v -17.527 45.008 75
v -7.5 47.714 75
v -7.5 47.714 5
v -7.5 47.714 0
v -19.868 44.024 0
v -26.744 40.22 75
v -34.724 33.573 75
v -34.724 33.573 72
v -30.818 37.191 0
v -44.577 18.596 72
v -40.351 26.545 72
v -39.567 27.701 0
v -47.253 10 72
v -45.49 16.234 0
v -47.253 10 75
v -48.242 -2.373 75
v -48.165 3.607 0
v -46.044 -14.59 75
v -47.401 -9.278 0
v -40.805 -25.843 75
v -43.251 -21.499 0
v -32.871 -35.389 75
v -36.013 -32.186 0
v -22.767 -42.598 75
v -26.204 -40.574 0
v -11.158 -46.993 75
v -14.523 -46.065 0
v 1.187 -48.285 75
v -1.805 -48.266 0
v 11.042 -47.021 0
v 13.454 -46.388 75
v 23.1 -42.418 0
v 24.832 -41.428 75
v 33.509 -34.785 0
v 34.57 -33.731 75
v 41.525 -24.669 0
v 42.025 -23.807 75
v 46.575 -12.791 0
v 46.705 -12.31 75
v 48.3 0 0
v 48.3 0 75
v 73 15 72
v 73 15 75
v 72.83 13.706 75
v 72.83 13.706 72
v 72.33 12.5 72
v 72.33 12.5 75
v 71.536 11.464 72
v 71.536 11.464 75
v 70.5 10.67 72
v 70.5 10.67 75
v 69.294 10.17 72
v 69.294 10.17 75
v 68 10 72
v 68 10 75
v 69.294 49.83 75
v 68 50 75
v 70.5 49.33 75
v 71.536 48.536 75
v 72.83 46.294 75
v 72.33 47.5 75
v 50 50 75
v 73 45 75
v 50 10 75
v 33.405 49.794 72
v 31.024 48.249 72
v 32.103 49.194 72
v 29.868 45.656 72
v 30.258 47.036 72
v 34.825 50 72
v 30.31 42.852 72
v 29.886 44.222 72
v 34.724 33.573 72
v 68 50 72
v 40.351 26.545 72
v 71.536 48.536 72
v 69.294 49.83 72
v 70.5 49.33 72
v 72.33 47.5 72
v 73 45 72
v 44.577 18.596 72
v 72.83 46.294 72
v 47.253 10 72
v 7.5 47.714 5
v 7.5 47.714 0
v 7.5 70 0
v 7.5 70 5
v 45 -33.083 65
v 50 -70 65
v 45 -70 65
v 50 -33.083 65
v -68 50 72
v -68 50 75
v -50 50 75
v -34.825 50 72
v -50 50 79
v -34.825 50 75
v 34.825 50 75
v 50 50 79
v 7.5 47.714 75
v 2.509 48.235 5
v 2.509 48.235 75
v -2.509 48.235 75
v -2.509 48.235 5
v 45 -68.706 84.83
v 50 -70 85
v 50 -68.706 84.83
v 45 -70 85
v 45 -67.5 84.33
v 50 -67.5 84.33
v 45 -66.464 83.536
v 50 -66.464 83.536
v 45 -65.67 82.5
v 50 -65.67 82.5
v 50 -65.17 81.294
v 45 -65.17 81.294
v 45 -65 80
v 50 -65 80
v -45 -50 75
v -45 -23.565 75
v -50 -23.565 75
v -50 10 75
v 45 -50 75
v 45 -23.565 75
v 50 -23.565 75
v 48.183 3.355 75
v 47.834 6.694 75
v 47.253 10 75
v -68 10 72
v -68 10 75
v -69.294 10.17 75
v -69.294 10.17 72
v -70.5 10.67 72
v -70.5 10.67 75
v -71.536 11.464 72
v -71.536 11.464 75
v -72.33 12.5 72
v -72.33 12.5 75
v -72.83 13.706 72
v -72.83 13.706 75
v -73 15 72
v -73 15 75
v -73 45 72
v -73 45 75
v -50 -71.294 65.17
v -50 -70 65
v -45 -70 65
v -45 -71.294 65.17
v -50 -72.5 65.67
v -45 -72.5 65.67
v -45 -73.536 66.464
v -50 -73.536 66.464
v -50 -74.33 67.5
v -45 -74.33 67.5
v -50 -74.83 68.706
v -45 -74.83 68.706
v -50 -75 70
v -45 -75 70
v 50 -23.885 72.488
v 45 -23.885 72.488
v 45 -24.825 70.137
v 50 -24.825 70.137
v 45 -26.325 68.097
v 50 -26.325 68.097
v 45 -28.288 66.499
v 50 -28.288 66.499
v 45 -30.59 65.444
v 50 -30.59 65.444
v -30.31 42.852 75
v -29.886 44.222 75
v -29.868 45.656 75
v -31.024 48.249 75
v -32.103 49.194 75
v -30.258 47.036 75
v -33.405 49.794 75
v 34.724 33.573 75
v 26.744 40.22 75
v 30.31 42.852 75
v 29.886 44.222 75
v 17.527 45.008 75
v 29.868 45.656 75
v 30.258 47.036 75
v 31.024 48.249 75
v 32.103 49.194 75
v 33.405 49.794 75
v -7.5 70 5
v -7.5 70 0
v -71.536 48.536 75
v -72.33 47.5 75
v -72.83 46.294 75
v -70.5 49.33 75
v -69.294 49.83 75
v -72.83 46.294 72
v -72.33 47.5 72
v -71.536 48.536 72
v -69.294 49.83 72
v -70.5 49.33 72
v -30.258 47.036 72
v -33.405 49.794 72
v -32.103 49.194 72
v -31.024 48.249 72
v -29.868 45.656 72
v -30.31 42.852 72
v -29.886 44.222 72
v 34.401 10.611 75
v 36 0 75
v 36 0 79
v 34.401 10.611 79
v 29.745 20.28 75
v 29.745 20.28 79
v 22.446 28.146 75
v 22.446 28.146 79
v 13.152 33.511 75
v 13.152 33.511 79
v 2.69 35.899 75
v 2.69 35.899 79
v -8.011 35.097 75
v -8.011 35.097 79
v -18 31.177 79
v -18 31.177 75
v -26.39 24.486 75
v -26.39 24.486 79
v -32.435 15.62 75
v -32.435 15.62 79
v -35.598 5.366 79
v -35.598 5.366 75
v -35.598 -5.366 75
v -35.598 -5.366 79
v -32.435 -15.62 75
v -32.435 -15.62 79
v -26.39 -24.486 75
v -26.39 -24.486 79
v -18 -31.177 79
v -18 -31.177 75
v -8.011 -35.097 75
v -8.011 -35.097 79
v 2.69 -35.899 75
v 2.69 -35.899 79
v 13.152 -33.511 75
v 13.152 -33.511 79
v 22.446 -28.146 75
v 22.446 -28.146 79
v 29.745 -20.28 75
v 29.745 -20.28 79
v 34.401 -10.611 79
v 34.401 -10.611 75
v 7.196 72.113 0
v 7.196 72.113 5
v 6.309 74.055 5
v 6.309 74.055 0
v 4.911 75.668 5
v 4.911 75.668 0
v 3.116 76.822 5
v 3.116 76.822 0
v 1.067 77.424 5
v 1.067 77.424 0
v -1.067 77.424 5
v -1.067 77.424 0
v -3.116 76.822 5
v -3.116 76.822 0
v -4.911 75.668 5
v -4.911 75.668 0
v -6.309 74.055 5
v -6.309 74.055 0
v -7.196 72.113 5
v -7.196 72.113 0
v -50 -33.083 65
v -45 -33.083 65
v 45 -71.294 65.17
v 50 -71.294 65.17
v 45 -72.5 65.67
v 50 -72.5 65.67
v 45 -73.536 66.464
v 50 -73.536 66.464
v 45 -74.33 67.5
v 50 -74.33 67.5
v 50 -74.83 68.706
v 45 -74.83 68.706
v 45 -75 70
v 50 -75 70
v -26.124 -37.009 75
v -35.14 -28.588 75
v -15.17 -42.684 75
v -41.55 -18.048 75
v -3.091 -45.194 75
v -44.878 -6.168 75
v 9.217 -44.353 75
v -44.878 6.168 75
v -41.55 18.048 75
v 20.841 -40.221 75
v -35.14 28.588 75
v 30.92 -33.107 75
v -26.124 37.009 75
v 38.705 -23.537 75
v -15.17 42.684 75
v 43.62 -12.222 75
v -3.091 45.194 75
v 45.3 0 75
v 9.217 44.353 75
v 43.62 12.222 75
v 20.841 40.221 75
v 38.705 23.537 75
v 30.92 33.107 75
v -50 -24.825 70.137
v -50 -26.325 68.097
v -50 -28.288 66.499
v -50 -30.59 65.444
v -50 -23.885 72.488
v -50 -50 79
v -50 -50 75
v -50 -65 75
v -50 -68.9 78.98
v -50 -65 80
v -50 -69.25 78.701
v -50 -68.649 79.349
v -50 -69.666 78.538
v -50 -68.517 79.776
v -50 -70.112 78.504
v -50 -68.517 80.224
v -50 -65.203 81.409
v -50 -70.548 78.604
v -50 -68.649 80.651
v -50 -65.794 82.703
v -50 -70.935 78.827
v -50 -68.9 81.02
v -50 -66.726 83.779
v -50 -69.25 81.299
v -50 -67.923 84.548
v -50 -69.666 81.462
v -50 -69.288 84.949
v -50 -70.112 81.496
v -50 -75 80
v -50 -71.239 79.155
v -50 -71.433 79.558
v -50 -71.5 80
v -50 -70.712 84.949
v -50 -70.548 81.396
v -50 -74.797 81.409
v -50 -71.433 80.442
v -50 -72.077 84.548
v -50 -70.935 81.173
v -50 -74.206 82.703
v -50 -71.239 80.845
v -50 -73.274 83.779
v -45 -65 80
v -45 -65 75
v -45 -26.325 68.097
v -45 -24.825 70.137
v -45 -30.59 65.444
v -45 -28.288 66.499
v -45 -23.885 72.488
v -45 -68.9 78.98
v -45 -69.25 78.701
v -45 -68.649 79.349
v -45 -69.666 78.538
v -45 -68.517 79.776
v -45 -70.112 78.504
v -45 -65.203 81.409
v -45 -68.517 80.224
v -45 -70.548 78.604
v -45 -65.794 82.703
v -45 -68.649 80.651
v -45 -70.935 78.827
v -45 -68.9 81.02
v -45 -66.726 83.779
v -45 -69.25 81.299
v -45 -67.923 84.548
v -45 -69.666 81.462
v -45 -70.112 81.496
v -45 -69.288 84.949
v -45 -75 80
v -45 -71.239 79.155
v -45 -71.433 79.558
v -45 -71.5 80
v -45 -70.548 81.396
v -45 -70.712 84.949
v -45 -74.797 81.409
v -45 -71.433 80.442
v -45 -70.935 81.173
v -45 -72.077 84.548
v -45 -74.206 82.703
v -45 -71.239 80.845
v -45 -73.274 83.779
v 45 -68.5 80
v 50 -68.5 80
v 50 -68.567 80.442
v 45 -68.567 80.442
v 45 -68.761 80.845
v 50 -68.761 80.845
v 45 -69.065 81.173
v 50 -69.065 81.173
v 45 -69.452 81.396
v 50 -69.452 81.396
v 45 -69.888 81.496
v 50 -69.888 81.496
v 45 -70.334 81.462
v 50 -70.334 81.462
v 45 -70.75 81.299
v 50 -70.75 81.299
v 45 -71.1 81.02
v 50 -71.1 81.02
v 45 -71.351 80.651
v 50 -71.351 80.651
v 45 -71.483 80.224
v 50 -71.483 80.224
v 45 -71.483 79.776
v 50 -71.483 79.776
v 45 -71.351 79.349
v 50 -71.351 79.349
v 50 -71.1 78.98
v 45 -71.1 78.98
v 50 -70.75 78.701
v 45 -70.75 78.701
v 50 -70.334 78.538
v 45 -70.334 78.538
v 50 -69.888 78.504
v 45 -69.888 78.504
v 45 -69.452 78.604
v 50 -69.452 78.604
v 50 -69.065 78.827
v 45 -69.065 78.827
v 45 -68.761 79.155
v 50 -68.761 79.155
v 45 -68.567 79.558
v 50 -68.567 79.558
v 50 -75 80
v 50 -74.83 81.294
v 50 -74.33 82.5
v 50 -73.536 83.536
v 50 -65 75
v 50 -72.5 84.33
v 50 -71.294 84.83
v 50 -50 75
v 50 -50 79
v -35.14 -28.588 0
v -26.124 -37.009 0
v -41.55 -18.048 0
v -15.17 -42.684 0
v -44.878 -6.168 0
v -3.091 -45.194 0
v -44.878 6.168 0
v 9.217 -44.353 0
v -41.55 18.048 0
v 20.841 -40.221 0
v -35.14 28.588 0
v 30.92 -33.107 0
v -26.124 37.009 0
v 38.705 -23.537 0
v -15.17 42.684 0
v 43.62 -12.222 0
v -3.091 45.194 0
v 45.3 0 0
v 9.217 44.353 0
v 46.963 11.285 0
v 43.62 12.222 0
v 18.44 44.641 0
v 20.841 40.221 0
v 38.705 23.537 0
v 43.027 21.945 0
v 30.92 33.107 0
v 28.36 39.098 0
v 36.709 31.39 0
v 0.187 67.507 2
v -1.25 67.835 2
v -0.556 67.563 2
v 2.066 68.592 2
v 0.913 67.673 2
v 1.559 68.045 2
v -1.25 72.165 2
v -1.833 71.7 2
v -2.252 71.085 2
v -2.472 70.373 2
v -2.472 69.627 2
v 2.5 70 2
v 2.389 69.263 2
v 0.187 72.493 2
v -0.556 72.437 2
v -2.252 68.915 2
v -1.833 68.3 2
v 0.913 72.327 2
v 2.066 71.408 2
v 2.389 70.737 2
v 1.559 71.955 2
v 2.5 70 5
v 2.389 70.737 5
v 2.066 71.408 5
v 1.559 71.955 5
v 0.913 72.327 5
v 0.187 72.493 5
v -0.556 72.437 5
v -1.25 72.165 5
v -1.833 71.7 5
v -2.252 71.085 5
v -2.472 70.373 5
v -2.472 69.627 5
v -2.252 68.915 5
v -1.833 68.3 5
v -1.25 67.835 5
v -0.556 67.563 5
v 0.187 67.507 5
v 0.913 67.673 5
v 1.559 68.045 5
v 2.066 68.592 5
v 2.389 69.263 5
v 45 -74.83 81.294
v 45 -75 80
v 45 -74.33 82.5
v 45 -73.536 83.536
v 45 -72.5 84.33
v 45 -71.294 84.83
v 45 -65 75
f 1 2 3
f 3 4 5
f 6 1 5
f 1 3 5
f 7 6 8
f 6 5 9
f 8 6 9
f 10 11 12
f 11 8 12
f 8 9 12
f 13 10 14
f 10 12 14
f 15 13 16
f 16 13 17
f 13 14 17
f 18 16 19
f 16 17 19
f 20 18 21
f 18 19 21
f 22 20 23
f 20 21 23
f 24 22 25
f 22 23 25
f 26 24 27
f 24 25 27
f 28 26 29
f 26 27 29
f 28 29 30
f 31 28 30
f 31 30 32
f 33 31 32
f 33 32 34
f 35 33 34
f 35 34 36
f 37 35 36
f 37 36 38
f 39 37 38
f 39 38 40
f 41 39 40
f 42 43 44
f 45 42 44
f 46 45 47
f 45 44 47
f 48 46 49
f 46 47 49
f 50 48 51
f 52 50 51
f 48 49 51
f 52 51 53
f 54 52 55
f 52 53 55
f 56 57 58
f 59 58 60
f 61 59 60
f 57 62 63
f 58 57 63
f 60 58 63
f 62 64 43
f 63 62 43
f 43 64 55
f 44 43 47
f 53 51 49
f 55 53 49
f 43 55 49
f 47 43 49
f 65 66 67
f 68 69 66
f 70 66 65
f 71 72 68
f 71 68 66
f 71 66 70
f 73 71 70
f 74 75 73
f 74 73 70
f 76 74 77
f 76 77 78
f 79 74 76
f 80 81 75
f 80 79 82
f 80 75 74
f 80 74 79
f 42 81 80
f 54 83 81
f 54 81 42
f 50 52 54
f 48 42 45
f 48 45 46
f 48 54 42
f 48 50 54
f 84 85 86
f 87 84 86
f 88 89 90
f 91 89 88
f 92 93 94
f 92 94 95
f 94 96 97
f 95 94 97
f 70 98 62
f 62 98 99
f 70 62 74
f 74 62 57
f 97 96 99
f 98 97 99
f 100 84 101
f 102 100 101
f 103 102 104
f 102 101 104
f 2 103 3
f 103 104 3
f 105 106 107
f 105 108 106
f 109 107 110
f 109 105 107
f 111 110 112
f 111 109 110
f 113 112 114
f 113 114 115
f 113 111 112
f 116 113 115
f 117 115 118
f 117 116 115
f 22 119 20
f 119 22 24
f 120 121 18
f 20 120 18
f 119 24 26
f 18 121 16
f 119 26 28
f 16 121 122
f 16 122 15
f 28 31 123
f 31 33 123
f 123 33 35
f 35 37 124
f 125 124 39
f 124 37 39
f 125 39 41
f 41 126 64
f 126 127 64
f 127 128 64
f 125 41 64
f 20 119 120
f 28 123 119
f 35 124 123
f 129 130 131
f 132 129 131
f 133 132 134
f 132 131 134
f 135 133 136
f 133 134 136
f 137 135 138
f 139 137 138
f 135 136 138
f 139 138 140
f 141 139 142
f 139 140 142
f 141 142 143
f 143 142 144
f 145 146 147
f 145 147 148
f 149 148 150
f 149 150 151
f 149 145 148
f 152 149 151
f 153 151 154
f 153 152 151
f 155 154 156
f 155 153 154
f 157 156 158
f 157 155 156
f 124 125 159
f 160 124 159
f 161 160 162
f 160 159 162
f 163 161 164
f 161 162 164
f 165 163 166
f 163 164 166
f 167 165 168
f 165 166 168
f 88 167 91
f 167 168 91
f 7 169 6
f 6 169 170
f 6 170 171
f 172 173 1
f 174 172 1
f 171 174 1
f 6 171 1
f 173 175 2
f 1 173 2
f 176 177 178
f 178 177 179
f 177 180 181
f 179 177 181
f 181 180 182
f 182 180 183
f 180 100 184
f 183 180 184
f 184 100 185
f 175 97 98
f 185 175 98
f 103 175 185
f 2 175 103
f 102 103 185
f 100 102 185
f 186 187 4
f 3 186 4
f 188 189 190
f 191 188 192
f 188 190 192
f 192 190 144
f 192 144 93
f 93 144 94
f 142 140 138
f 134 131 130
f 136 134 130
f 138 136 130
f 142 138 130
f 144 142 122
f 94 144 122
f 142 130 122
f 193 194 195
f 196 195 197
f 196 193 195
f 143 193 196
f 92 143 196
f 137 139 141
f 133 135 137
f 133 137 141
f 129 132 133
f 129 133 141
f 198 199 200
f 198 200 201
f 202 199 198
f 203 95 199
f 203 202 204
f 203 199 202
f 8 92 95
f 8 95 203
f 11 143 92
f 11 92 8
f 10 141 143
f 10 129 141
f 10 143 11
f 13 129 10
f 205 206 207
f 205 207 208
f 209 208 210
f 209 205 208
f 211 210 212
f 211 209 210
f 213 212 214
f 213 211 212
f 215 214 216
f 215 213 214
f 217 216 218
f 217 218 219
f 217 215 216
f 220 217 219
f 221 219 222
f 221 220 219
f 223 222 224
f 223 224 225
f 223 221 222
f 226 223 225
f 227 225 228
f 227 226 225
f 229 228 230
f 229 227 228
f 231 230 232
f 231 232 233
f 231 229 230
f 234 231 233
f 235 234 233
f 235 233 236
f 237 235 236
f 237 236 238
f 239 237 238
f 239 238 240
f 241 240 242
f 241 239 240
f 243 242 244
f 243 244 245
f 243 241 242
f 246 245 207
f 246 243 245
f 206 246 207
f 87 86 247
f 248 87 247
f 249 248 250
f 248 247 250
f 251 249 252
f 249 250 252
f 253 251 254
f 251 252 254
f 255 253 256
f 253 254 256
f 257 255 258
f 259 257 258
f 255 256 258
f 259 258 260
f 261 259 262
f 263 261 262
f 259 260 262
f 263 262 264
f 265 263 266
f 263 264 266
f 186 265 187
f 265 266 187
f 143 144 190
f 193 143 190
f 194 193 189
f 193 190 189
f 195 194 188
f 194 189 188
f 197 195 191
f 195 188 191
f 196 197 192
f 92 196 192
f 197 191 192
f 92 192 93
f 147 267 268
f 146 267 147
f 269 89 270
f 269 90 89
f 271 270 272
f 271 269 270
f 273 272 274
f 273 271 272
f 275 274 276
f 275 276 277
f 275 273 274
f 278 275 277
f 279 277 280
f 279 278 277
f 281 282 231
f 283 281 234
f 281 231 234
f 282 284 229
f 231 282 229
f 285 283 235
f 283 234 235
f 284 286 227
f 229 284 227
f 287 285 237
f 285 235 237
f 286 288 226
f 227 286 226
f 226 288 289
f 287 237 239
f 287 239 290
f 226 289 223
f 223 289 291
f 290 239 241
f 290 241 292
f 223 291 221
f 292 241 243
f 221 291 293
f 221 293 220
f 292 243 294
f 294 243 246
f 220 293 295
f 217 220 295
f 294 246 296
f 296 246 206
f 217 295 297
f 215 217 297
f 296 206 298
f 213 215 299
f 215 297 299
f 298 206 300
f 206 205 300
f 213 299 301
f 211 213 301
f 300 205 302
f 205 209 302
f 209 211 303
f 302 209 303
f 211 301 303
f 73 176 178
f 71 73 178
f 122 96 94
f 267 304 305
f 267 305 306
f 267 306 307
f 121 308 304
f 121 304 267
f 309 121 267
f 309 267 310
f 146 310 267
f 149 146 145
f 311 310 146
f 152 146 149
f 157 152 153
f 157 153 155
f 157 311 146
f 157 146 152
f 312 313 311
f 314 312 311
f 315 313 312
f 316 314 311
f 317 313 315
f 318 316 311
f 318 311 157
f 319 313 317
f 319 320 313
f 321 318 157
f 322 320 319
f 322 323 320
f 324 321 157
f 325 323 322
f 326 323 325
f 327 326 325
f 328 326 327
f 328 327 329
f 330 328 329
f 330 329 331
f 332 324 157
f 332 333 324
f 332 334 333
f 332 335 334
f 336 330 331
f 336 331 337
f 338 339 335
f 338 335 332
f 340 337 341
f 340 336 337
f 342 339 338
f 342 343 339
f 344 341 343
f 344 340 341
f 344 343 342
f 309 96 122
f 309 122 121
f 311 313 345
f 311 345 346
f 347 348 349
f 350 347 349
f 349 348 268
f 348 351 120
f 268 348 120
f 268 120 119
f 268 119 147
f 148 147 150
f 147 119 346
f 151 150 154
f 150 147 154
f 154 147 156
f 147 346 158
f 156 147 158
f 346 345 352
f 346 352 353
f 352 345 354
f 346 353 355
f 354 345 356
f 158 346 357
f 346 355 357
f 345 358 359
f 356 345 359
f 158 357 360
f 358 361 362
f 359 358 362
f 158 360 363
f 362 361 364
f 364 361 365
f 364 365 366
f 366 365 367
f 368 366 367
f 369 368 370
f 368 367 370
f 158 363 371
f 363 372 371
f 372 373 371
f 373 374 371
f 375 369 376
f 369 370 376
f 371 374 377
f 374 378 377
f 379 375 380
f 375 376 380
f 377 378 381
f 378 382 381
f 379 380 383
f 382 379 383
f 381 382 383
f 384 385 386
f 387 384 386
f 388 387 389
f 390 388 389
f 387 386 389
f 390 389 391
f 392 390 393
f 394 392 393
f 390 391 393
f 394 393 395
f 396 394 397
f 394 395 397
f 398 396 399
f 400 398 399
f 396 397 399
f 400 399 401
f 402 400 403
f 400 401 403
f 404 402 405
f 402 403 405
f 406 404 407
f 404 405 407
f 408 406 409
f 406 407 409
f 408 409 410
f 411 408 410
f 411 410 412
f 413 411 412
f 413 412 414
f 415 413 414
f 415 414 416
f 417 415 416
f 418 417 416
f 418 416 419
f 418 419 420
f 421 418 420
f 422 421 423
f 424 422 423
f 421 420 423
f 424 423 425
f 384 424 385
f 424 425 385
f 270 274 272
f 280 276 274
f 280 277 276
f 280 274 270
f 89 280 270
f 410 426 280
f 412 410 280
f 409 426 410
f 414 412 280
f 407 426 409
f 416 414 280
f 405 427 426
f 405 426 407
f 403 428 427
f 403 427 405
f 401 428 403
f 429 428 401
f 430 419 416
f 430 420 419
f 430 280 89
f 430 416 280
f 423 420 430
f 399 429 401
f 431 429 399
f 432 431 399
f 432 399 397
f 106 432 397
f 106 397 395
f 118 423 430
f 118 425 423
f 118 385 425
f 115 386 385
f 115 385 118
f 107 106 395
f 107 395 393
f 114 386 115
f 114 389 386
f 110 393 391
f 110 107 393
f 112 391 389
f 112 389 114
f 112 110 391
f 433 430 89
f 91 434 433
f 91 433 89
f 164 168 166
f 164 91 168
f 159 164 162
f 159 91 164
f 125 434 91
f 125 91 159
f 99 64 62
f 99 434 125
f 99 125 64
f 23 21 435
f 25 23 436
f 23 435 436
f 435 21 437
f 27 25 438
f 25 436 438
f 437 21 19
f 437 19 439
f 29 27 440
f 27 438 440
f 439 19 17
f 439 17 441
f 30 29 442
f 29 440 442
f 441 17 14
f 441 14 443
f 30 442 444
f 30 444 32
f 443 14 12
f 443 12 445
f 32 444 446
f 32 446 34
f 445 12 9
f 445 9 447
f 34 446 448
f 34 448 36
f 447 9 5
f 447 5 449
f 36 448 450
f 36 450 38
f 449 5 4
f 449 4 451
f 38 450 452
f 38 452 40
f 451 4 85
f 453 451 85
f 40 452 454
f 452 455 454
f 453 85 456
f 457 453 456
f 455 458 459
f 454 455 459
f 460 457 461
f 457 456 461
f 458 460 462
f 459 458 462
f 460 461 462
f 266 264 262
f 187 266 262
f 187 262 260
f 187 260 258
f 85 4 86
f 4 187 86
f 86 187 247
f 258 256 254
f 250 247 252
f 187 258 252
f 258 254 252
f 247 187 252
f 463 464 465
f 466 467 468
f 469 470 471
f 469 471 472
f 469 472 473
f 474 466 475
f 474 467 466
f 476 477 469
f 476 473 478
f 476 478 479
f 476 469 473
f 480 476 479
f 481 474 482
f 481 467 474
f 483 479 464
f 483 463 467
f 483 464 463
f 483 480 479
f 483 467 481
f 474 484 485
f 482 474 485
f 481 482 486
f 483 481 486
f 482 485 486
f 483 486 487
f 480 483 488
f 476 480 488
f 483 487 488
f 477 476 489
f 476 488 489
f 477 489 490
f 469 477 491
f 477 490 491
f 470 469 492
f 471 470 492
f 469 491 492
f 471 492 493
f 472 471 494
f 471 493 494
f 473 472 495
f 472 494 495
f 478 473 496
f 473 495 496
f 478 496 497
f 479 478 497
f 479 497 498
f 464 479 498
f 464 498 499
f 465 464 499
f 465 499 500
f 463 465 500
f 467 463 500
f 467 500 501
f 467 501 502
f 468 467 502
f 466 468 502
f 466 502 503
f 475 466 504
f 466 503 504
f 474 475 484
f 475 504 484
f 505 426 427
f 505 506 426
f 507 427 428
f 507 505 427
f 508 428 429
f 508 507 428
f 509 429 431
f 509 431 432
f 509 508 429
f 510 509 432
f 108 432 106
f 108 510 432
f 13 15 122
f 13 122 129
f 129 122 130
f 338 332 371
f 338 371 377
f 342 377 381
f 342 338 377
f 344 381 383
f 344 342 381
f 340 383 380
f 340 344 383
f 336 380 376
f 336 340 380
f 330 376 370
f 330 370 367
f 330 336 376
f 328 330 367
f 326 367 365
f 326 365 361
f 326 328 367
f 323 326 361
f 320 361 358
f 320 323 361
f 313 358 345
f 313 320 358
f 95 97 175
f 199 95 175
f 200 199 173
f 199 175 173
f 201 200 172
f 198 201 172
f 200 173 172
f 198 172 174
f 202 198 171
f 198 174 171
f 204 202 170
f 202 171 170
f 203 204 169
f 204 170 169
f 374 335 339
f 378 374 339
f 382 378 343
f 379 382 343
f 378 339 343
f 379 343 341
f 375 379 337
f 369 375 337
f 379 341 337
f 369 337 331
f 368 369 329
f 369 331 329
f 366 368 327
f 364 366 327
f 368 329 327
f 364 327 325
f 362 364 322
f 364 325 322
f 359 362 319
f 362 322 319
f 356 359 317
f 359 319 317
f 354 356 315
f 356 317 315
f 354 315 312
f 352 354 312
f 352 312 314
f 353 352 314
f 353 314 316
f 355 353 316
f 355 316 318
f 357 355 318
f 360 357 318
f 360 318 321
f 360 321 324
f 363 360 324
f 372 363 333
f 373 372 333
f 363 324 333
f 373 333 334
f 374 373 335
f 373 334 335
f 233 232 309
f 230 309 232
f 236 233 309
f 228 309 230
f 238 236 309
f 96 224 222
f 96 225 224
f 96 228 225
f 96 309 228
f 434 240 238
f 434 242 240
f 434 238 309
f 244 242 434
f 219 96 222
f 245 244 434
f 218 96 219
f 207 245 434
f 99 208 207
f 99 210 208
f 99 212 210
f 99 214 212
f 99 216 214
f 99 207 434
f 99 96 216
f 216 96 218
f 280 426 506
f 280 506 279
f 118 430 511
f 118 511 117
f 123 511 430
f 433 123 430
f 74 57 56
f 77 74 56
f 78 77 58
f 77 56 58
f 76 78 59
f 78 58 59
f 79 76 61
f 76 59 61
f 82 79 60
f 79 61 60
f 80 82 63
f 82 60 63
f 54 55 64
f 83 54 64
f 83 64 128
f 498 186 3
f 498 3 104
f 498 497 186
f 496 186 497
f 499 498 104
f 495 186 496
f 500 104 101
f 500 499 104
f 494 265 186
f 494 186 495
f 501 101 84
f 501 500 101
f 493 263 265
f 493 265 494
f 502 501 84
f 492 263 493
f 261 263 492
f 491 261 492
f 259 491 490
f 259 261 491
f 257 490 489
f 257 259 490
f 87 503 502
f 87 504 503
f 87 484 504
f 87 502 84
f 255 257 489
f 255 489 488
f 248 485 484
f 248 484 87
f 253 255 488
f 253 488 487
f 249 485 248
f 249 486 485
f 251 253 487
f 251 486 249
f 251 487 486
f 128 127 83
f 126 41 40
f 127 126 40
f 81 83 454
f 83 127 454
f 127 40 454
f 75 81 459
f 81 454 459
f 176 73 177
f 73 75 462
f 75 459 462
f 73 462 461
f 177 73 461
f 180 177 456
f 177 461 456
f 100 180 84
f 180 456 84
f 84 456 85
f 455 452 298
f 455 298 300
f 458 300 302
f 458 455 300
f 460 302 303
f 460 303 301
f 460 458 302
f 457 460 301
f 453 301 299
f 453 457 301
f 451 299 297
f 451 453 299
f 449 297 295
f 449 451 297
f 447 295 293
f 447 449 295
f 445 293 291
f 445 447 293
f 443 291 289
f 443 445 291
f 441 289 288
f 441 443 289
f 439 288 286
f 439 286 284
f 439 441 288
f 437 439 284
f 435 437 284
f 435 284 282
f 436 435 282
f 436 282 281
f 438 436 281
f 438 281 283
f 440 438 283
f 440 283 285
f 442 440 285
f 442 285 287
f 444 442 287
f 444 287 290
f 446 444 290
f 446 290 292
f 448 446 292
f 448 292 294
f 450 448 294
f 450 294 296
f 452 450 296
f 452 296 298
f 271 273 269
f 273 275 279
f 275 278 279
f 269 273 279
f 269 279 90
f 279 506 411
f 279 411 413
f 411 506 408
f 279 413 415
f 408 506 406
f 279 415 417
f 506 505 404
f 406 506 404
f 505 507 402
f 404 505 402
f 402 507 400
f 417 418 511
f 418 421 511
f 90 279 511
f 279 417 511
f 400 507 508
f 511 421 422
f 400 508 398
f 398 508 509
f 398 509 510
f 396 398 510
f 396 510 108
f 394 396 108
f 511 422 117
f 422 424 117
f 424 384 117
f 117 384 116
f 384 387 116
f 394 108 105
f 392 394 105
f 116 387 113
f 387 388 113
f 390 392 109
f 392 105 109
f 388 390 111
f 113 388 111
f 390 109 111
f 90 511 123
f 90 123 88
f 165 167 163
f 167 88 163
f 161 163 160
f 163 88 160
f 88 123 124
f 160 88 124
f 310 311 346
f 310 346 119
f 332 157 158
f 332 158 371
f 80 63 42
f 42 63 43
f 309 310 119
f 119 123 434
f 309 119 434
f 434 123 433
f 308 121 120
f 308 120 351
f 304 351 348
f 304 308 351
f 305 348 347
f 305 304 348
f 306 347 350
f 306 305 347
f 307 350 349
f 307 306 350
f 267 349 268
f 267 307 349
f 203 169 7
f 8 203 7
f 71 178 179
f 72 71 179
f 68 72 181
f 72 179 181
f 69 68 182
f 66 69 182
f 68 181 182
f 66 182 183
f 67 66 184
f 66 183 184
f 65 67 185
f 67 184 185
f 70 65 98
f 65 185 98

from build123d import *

# Parameters (mm, degrees)
F0_R      = 45.3
F1_DEPTH  = 75
F2_DEPTH  = 5
F3_R      = 2.5
F4_DEPTH  = 3
F5_W      = 100
F5_H      = 100
F5_R      = 48.3
F5_R_2    = 45.3
F5_R_3    = 36
F6_DEPTH  = 4
F8_DEPTH  = 3
F9_W      = 5
F9_H      = 26.435303688
F9_H_2    = 20
F10_DEPTH = 10
F12_DEPTH = 5
F14_DEPTH = 5
F15_R     = 5
F16_R     = 4.99999
F17_R     = 1.5
F18_DEPTH = 5
F20_R     = 1.5
F21_DEPTH = 5


# Not quite as in the source:
# - a fillet or chamfer is up to 0.001 mm smaller than in the source, because OpenCascade refuses the exact size


with BuildPart() as f1:
    # F0 (on Top) → F1 (new body)
    with BuildSketch(Plane.XY):
        with BuildLine():
            ThreePointArc((-7.5, 47.714148845), (-31.3898072629, -36.7092631362), (48.3, 0))
            ThreePointArc((48.3, 0), (36.7092631362, 31.3898072629), (7.5, 47.714148845))
            Line((7.5, 47.714148845), (7.5, 46.6673743725))
            Line((7.5, 46.6673743725), (-7.5, 46.6673743725))
            Line((-7.5, 46.6673743725), (-7.5, 47.714148845))
        make_face()
        Circle(F0_R, mode=Mode.SUBTRACT)
        with BuildLine():
            Line((7.5, 46.6673743725), (7.5, 47.714148845))
            ThreePointArc((7.5, 47.714148845), (0, 48.3), (-7.5, 47.714148845))
            Line((-7.5, 47.714148845), (-7.5, 46.6673743725))
            Line((-7.5, 46.6673743725), (7.5, 46.6673743725))
        make_face()
    extrude(amount=F1_DEPTH)

    # F0 (on Top) → F2 (join)
    with BuildSketch(Plane.XY):
        with BuildLine():
            ThreePointArc((-7.5, 47.714148845), (-31.3898072629, -36.7092631362), (48.3, 0))
            ThreePointArc((48.3, 0), (36.7092631362, 31.3898072629), (7.5, 47.714148845))
            Line((7.5, 47.714148845), (7.5, 46.6673743725))
            Line((7.5, 46.6673743725), (-7.5, 46.6673743725))
            Line((-7.5, 46.6673743725), (-7.5, 47.714148845))
        make_face()
        Circle(F0_R, mode=Mode.SUBTRACT)
        with BuildLine():
            Line((7.5, 46.6673743725), (7.5, 47.714148845))
            ThreePointArc((7.5, 47.714148845), (0, 48.3), (-7.5, 47.714148845))
            Line((-7.5, 47.714148845), (-7.5, 46.6673743725))
            Line((-7.5, 46.6673743725), (7.5, 46.6673743725))
        make_face()
        with BuildLine():
            ThreePointArc((-7.5, 47.714148845), (0, 48.3), (7.5, 47.714148845))
            Line((7.5, 47.714148845), (7.5, 70))
            ThreePointArc((7.5, 70), (0, 77.5), (-7.5, 70))
            Line((-7.5, 70), (-7.5, 47.714148845))
        make_face()
    extrude(amount=F2_DEPTH)

    # F3 (on face) → F4 (cut)
    with BuildSketch(Plane.XY.offset(5)):
        with Locations((0, 70)):
            Circle(F3_R)
    extrude(amount=-F4_DEPTH, mode=Mode.SUBTRACT)

    # F5 (on face) → F6 (join)
    with BuildSketch(Plane.XY.offset(75)):
        Rectangle(F5_W, F5_H)
        Circle(F5_R, mode=Mode.SUBTRACT)
        Circle(F5_R)
        Circle(F5_R_2, mode=Mode.SUBTRACT)
        Circle(F5_R_2)
        Circle(F5_R_3, mode=Mode.SUBTRACT)
    extrude(amount=F6_DEPTH)

    # F7 (on face) → F8 (join)
    with BuildSketch(Plane(origin=(0, 0, 75), x_dir=(1, 0, 0), z_dir=(0, 0, -1))):
        with BuildLine():
            Line((-68, -50), (-45.938372612, -50))
            Line((-45.938372612, -50), (-34.8247885738, -50))
            ThreePointArc((-34.8247885738, -50), (-30.5975043414, -47.6702187211), (-30.3096791752, -42.8520272073))
            Line((-30.3096791752, -42.8520272073), (-45.938372612, -10))
            Line((-45.938372612, -10), (-68, -10))
            ThreePointArc((-68, -10), (-71.5355339059, -11.4644660941), (-73, -15))
            Line((-73, -15), (-73, -45))
            ThreePointArc((-73, -45), (-71.5355339059, -48.5355339059), (-68, -50))
        make_face()
        with BuildLine():
            Line((68, -10), (45.938372612, -10))
            Line((45.938372612, -10), (30.3096791752, -42.8520272073))
            ThreePointArc((30.3096791752, -42.8520272073), (30.5975043414, -47.6702187211), (34.8247885738, -50))
            Line((34.8247885738, -50), (45.938372612, -50))
            Line((45.938372612, -50), (68, -50))
            ThreePointArc((68, -50), (71.5355339059, -48.5355339059), (73, -45))
            Line((73, -45), (73, -15))
            ThreePointArc((73, -15), (71.5355339059, -11.4644660941), (68, -10))
        make_face()
    extrude(amount=F8_DEPTH)

    # F9 (on face) → F10 (join)
    with BuildSketch(Plane(origin=(0, 0, 75), x_dir=(1, 0, 0), z_dir=(0, 0, -1))):
        with Locations((47.5, 36.782348156)):
            Rectangle(F9_W, F9_H)
        with Locations((47.5, 60)):
            Rectangle(F9_W, F9_H_2)
    extrude(amount=F10_DEPTH)

    # F11 (on face) → F12 (cut, through all)
    with BuildSketch(Plane.YZ.offset(50)):
        with BuildLine():
            ThreePointArc((-23.564696312, 75), (-26.3246425928, 68.0971789948), (-33.0828763545, 65))
            Line((-33.0828763545, 65), (-23.564696312, 65))
            Line((-23.564696312, 65), (-23.564696312, 75))
        make_face()
    extrude(amount=-F12_DEPTH, mode=Mode.SUBTRACT)

    # F13 (on face) → F14 (join)
    with BuildSketch(Plane.YZ.offset(50)):
        Polygon((-70, 65), (-70, 75), (-65, 75), (-65, 85), (-75, 85), (-75, 65), align=None)
    extrude(amount=-F14_DEPTH)

    # F15
    f15_edges = [f1.edges().sort_by_distance(p)[0] for p in [
        (47.5, -75, 65),
    ]]
    fillet(f15_edges, radius=F15_R)

    # F16 (radius 5 in the source; OpenCascade refuses exactly that, so slightly less here)
    f16_edges = [f1.edges().sort_by_distance(p)[0] for p in [
        (47.5, -75, 85),
        (47.5, -65, 85),
    ]]
    fillet(f16_edges, radius=F16_R)

    # F17 (on face) → F18 (cut, through all)
    with BuildSketch(Plane.YZ.offset(50)):
        with Locations((-70, 80)):
            Circle(F17_R)
    extrude(amount=-F18_DEPTH, mode=Mode.SUBTRACT)

    # F20 (on offset) → F21 (join)
    with BuildSketch(Plane(origin=(-50, 0, 0), x_dir=(0, -1, 0), z_dir=(-1, 0, 0))):
        with BuildLine():
            Line((75, 70), (75, 80))
            ThreePointArc((75, 80), (70, 85), (65, 80))
            Line((65, 80), (65, 75))
            Line((65, 75), (50, 75))
            Line((50, 75), (23.564696312, 75))
            ThreePointArc((23.564696312, 75), (26.3246425928, 68.0971789948), (33.0828763545, 65))
            Line((33.0828763545, 65), (70, 65))
            ThreePointArc((70, 65), (73.5355339059, 66.4644660941), (75, 70))
        make_face()
        with Locations((70, 80)):
            Circle(F20_R, mode=Mode.SUBTRACT)
    extrude(amount=-F21_DEPTH)


solid = f1.part
